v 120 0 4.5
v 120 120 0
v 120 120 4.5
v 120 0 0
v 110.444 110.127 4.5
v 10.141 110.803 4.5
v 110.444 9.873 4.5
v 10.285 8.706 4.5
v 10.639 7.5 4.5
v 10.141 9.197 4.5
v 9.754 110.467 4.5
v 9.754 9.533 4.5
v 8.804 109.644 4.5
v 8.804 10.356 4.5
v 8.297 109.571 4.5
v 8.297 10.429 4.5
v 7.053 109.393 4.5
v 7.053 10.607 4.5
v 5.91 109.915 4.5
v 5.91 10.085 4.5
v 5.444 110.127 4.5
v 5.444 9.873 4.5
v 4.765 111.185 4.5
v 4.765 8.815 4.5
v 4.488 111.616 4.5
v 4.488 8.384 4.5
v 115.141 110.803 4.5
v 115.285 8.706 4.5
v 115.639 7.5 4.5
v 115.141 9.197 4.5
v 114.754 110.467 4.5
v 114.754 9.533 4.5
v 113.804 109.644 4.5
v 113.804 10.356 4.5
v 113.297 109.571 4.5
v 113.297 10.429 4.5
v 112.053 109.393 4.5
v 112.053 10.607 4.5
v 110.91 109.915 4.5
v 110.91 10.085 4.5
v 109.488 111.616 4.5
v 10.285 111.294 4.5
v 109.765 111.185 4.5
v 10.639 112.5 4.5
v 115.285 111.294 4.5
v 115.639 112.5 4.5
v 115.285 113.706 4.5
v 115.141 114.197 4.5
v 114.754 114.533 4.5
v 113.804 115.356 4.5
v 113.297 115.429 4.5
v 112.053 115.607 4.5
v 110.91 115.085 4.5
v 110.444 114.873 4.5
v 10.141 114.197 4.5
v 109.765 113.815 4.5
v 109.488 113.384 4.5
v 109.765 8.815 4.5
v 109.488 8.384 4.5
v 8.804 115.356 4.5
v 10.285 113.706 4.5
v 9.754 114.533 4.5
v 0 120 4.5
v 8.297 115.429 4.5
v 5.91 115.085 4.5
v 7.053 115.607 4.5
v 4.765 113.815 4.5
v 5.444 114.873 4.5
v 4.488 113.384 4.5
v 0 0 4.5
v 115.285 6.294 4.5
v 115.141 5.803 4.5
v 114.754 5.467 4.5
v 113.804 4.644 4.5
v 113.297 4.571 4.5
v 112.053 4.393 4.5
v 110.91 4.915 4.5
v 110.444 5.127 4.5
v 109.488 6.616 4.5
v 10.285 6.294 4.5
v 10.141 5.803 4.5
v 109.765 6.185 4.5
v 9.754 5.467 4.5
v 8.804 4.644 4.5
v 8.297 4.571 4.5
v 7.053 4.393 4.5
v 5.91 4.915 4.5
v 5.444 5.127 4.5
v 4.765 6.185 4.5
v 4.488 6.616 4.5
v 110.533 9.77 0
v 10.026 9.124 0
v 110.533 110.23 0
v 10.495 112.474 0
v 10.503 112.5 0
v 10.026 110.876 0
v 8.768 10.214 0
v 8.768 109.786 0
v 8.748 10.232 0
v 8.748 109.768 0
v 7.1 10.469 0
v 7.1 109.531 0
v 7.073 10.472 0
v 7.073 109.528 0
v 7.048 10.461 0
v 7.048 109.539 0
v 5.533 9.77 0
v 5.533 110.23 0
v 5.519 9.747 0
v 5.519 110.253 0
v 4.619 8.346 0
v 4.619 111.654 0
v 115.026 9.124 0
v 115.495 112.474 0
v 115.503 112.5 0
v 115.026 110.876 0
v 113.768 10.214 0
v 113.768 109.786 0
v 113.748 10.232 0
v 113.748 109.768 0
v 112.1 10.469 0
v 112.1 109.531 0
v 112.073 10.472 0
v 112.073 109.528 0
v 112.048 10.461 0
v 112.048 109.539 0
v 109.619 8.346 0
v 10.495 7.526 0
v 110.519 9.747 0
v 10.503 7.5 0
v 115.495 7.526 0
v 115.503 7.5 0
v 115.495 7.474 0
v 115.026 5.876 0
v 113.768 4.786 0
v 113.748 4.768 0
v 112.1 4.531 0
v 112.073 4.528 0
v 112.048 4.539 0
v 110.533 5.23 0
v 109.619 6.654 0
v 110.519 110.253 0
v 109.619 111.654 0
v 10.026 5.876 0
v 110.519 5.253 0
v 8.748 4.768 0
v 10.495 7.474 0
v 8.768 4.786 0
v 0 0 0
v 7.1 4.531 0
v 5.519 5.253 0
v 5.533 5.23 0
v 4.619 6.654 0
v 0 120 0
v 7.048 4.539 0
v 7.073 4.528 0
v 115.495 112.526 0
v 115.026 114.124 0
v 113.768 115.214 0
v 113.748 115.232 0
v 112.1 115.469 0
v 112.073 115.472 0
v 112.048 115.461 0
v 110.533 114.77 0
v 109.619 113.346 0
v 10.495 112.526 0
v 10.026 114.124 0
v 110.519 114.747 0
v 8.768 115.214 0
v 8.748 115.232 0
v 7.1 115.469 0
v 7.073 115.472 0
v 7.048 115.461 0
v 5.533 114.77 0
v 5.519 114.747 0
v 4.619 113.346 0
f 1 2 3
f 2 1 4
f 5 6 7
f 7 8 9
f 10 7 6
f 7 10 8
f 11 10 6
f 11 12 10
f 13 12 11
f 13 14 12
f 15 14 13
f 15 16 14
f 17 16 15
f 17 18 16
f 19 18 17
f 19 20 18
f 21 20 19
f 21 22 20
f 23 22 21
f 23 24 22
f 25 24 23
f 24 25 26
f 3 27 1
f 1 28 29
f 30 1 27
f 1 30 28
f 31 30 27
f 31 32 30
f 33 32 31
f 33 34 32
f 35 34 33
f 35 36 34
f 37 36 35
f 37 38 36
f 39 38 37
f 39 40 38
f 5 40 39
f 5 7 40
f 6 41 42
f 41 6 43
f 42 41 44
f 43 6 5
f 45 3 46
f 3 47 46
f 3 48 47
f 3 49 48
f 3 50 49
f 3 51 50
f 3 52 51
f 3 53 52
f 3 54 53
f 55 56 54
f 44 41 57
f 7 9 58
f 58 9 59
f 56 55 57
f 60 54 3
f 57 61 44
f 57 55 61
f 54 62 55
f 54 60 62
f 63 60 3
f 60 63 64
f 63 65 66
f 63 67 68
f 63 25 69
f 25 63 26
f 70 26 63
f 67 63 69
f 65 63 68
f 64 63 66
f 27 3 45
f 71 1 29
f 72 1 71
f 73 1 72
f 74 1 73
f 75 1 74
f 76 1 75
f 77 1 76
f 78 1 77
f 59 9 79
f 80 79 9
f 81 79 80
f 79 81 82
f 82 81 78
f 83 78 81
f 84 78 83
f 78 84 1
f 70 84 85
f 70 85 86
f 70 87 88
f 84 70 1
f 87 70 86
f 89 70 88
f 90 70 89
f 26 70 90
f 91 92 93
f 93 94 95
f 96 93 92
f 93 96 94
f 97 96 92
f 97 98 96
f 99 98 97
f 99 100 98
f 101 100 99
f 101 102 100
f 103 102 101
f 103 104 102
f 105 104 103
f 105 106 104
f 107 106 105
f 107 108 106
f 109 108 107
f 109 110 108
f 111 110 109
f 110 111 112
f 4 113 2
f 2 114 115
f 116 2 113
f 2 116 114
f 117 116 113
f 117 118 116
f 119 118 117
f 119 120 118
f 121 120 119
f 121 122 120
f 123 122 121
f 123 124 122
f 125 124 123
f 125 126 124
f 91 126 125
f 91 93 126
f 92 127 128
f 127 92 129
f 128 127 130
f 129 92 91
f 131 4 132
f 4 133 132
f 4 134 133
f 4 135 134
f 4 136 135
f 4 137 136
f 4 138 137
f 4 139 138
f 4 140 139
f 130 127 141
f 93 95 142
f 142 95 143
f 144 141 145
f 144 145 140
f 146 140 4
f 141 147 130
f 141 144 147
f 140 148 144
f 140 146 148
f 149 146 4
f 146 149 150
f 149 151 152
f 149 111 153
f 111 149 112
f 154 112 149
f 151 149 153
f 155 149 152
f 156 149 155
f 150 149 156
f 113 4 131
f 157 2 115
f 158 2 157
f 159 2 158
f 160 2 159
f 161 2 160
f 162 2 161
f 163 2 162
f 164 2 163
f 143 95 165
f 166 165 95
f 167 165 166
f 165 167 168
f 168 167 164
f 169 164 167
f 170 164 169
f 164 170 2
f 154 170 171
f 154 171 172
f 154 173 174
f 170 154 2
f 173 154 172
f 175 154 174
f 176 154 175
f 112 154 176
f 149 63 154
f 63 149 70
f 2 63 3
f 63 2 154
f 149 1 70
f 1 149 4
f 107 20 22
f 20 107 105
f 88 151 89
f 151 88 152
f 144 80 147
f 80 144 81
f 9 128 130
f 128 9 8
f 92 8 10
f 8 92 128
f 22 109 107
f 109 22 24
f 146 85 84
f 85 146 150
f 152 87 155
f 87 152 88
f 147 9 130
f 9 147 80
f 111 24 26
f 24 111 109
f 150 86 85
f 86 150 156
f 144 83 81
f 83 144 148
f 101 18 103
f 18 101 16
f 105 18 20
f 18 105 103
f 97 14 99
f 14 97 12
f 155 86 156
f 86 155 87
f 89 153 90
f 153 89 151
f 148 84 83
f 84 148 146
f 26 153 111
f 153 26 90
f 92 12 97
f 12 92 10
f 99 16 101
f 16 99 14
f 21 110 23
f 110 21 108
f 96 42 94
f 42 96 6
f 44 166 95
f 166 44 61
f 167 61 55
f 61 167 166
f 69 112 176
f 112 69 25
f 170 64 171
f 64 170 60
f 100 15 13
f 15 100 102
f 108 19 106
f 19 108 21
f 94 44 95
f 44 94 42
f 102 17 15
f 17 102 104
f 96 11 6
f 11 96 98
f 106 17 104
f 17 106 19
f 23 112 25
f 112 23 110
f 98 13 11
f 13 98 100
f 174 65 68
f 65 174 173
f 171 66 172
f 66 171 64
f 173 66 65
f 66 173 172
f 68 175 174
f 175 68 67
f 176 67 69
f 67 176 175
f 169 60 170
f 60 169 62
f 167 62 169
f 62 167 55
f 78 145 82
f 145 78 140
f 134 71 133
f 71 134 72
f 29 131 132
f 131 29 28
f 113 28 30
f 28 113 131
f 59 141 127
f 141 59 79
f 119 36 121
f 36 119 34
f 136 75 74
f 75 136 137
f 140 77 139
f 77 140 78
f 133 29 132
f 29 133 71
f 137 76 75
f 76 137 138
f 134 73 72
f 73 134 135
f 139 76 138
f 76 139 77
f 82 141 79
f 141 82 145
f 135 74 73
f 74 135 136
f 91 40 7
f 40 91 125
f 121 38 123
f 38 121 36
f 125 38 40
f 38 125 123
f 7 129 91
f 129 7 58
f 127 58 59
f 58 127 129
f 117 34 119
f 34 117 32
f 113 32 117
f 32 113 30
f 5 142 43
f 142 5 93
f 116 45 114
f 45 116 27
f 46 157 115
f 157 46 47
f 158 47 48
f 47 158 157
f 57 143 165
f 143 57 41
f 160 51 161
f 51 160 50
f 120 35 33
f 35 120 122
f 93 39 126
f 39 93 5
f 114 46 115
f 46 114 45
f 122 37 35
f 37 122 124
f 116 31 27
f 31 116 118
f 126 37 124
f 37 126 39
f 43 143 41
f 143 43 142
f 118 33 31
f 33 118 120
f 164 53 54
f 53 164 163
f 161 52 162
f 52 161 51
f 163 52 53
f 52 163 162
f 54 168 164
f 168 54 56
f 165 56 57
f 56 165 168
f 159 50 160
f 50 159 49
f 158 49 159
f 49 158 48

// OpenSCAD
difference(){
// union() {
    cube([120,120,4.5]);
    translate([7.5,7.5, -0.1]){
        cylinder(6.6,3,3.2);
    };
    translate([7.5,120-7.5, -0.1]){
        cylinder(6.6,3,3.2);
    };
    translate([120-7.5,7.5, -0.1]){
        cylinder(6.6,3,3.2);
    };
    translate([120-7.5,120-7.5, -0.1]){
        cylinder(6.6,3,3.2);
    }
}
